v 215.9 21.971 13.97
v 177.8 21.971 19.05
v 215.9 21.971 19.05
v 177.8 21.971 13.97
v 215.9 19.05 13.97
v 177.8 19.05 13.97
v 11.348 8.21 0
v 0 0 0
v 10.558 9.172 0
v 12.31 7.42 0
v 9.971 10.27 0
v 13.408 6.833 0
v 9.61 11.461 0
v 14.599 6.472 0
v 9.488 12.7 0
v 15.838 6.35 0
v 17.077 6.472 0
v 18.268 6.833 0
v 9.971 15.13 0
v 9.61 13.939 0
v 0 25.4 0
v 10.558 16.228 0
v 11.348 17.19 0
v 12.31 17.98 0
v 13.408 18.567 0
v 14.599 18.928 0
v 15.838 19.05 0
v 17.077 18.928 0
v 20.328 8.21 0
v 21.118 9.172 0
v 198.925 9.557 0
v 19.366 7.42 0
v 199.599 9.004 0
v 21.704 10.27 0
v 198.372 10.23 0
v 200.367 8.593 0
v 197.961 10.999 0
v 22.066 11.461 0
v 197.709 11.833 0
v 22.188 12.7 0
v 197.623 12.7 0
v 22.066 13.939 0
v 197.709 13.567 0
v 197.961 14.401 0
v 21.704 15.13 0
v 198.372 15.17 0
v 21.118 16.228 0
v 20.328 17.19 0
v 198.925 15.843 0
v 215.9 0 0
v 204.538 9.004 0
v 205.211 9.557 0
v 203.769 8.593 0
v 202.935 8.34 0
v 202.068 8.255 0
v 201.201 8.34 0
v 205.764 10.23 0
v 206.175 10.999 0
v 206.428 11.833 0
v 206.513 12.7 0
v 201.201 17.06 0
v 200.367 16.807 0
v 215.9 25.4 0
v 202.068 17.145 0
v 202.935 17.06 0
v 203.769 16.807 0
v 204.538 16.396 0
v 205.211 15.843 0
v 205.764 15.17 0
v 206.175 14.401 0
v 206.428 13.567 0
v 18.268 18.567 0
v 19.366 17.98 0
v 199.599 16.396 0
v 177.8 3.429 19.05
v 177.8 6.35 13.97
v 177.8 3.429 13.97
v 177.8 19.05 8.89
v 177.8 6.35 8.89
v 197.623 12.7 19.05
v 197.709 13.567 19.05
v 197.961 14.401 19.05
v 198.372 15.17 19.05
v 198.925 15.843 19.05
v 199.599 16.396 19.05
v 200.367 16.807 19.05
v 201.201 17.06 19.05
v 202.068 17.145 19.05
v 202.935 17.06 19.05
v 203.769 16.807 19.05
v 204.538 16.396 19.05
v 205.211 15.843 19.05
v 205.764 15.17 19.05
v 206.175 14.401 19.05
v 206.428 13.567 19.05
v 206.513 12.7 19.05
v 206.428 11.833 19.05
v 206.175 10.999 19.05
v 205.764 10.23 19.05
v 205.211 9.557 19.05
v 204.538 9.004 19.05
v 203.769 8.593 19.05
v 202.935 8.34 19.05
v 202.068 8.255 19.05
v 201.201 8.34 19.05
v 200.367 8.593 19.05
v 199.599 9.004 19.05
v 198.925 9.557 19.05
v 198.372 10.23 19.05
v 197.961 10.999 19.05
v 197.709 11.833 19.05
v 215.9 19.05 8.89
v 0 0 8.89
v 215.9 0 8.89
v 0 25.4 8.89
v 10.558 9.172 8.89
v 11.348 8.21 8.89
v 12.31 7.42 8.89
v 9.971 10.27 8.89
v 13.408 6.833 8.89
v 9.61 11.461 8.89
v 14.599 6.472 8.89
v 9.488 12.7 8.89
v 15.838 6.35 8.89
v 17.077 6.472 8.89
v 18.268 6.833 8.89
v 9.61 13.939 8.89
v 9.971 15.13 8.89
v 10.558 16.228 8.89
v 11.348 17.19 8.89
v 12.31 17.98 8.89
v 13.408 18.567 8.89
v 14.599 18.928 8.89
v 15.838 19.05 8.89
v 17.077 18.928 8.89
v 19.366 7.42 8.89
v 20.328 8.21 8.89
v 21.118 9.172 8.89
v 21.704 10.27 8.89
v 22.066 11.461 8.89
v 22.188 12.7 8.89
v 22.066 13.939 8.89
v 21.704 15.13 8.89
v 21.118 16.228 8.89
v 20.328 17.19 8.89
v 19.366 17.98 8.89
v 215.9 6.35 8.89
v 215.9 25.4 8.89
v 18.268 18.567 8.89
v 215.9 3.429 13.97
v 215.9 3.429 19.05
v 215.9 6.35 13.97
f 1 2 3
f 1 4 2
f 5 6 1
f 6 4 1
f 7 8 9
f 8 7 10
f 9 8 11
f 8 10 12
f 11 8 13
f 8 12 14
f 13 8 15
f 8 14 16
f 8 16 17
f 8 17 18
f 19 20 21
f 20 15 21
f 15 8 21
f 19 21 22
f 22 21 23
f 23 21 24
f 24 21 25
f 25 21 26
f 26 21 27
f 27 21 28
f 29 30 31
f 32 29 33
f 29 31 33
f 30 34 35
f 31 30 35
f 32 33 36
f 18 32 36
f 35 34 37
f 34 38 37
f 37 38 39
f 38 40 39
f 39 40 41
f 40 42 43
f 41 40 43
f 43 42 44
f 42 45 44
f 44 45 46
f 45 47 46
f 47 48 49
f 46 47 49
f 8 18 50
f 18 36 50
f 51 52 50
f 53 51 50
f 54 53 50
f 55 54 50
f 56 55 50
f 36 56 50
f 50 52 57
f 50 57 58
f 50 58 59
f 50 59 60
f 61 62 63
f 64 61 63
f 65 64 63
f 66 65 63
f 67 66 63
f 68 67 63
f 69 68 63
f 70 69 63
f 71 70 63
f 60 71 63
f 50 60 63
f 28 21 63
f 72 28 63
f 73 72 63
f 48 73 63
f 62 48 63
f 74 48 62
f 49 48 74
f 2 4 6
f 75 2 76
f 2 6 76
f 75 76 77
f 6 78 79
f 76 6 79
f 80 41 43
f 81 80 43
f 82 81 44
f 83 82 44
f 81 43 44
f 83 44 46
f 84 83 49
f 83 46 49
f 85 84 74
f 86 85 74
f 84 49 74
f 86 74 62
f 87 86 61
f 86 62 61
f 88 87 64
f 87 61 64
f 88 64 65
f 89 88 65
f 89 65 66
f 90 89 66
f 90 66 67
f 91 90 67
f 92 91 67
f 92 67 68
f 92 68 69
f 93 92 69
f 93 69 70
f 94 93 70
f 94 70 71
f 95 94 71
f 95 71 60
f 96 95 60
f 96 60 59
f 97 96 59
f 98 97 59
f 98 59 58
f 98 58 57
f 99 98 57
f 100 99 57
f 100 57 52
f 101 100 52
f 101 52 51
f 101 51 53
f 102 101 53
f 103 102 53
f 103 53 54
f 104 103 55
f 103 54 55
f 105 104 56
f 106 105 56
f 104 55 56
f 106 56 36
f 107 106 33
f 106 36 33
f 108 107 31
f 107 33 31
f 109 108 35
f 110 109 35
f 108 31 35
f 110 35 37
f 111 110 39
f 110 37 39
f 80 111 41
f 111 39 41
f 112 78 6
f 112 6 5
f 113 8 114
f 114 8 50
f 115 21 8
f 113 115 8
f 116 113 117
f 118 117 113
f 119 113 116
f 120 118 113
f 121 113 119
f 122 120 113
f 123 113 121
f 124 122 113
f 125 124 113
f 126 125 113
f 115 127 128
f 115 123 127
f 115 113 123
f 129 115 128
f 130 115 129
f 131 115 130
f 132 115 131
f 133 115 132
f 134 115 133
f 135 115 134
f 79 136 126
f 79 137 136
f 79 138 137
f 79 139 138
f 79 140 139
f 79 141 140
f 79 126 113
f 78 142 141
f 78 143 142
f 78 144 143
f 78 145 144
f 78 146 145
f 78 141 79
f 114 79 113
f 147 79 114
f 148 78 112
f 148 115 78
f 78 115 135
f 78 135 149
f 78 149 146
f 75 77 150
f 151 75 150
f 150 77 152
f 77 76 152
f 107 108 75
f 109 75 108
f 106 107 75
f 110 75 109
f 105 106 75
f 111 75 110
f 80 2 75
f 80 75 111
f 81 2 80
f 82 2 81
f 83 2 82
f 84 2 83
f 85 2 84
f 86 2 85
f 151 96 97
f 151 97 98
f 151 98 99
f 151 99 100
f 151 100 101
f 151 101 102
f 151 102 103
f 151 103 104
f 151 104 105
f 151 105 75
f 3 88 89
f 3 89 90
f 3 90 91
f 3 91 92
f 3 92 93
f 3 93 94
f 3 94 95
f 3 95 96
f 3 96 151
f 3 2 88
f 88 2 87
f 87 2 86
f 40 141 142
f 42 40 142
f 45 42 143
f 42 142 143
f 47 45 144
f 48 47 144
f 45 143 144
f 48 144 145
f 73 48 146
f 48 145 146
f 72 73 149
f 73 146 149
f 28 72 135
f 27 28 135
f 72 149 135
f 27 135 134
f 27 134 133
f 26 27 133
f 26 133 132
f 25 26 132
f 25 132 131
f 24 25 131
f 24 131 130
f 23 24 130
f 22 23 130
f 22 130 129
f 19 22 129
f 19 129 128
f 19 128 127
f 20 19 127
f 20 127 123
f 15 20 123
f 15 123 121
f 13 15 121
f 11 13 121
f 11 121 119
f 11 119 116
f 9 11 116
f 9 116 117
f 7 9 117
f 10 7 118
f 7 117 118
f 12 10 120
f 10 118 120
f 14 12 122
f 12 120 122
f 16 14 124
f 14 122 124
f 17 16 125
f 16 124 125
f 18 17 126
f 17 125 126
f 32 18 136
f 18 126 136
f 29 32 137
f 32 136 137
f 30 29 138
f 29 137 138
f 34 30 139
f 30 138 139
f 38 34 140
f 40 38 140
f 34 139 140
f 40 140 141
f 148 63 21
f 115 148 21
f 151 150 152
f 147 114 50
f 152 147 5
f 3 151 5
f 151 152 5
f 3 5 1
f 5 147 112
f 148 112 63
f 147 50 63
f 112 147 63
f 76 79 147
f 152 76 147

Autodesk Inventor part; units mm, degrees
ref_plane "YZ Plane" through (0, 0, 0) normal (1, 0, 0) x (0, 1, 0)
ref_plane "XZ Plane" through (0, 0, 0) normal (0, 1, 0) x (-1, 0, 0)
ref_plane "XY Plane" through (0, 0, 0) normal (0, 0, 1) x (1, 0, 0)
sketch "Sketch1" plane through (0, 0, 0) normal (0, 0, 1) x (1, 0, 0)
  line L0 (0, 0) -> (215.9, 0)
  line L1 (215.9, 0) -> (215.9, 25.4)
  line L2 (215.9, 25.4) -> (0, 25.4)
  line L3 (0, 25.4) -> (0, 0)
  dimension "d0" = 215.9
  dimension "d1" = 25.4
extrude "Extrusion1" add sketch "Sketch1" along normal blind 8.89
sketch "Sketch2" plane through (0, 0, 8.89) normal (0, 0, 1) x (1, 0, 0)
  line L0 (0, 0) -> (215.9, 0) projected
  line L1 (215.9, 0) -> (215.9, 25.4) projected
  line L2 (215.9, 25.4) -> (177.8, 25.4)
  line L3 (177.8, 25.4) -> (177.8, 0)
  line L4 (177.8, 0) -> (215.9, 0)
  line L5 (215.9, 0) -> (215.9, 25.4)
  line L6 (215.9, 25.4) -> (177.8, 25.4)
  line L7 (177.8, 25.4) -> (177.8, 12.7)
  line L8 (177.8, 12.7) -> (215.9, 12.7)
  line L9 (215.9, 12.7) -> (215.9, 25.4)
  line L10 (215.9, 25.4) -> (177.8, 25.4)
  line L11 (177.8, 25.4) -> (177.8, 19.05)
  line L12 (177.8, 19.05) -> (215.9, 19.05)
  line L13 (215.9, 19.05) -> (215.9, 25.4)
  line L14 (215.9, 0) -> (177.8, 0)
  line L15 (177.8, 0) -> (177.8, 6.35)
  line L16 (177.8, 6.35) -> (215.9, 6.35)
  line L17 (215.9, 6.35) -> (215.9, 0)
  dimension "d4" = 6.35
  dimension "d5" = 38.1
extrude "Extrusion2" add sketch "Sketch2" along normal blind 5.08 contours L3 L8 L1 L16 | L3 L12 L1 L8
sketch "Sketch3" plane through (0, 0, 13.97) normal (0, 0, 1) x (1, 0, 0)
  line L0 (215.9, 19.05) -> (177.8, 19.05) projected
  line L1 (177.8, 19.05) -> (177.8, 6.35) projected
  line L2 (177.8, 6.35) -> (215.9, 6.35)
  line L3 (215.9, 6.35) -> (215.9, 19.05)
  line L4 (215.9, 19.05) -> (177.8, 19.05)
  line L5 (177.8, 19.05) -> (177.8, 6.35)
  line L6 (215.9, 19.05) -> (177.8, 19.05)
  line L7 (177.8, 19.05) -> (177.8, 21.971)
  line L8 (177.8, 21.971) -> (215.9, 21.971)
  line L9 (215.9, 21.971) -> (215.9, 19.05)
  line L10 (215.9, 6.35) -> (177.8, 6.35)
  line L11 (177.8, 6.35) -> (177.8, 3.429)
  line L12 (177.8, 3.429) -> (215.9, 3.429)
  line L13 (215.9, 3.429) -> (215.9, 6.35)
  point P0 (0, 0)
  dimension "d8" = 2.921
  dimension "d9" = 2.921
extrude "Extrusion3" add sketch "Sketch3" along normal blind 5.08
sketch "Sketch4" plane through (0, 0, 0) normal (0, 0, -1) x (-1, 0, 0)
  circle A0 centre (-202.0681, 12.7) radius 4.445
  dimension "d12" = 8.89
extrude "Extrusion4" cut sketch "Sketch4" against normal blind 127
sketch "Sketch5" plane through (0, 0, 8.89) normal (0, 0, 1) x (1, 0, 0)
  circle A0 centre (15.8377, 12.7) radius 6.35
  dimension "d17" = 12.7
extrude "Extrusion5" cut sketch "Sketch5" against normal blind 25.4
properties part number "Piece One-Diagonal Piece" material "Steel"
